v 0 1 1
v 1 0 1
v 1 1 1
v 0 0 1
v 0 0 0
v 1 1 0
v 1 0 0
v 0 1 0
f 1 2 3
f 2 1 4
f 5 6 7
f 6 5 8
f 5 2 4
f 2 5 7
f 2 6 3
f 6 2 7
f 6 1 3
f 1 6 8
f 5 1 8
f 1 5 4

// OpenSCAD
// file: ../modules/wall_plate.scad
// ===== wall plate + lock bracket =====
// Plate frame: x across, y up (= world z, 0 at the bottom of the amp box), z out of the wall
// (z = 0 is the wall side). Printed BACK DOWN: the keyhole cavities open onto the bed and the lip
// over them is an ~8.4 mm bridge; the header block and the countersinks are on top.

function kh_slot_w() = peg_neck_d + 2*kh_clr;
function kh_head_d() = peg_head_d + 2*kh_clr;
// every peg, in plate coordinates, at its HUNG position (bottom of its slot)
function peg_pts() = concat(
    [for (sx = [-1, 1], py = peg_y_amp)   [sx*peg_x(), py]],
    [for (sx = [-1, 1], py = peg_y_voice) [sx*peg_x(), voice_z0() + py]]);
function header_w() = 2*(peg_x() - leg_w/2 - 1);
function ws_pts() = [for (sx = [-1, 1], y = [12, plate_h() - header_h - 12]) [sx*ws_x, y]];

module wall_plate() {
    difference() {
        union() {
            translate([-plate_w()/2, 0, 0]) cube([plate_w(), plate_h(), plate_t]);
            // header between the legs, for the lock bracket's inserts
            translate([-header_w()/2, plate_h() - header_h, plate_t - 0.01])
                cube([header_w(), header_h, header_d - plate_t + 0.01]);
        }
        for (p = peg_pts()) translate([p[0], p[1], 0]) {
            // lip: the keyhole proper
            translate([0, 0, plate_t - kh_lip - 0.1]) linear_extrude(kh_lip + 0.2)
                keyhole2d(kh_slot_w(), kh_head_d(), peg_drop);
            // cavity behind it, head-wide over the whole travel, open to the wall
            translate([0, 0, -0.1]) linear_extrude(plate_t - kh_lip + 0.1)
                keyhole2d(kh_head_d(), kh_head_d(), peg_drop);
        }
        // wall screws, countersunk on the front face
        for (p = ws_pts()) translate([p[0], p[1], 0]) {
            translate([0, 0, -0.1]) cylinder(h = plate_t + 0.2, d = ws_d);
            translate([0, 0, plate_t - (ws_head_d - ws_d)/2])
                cylinder(h = (ws_head_d - ws_d)/2 + 0.01, d1 = ws_d, d2 = ws_head_d);
        }
        // lock-bracket inserts, down into the header's top face
        for (sx = [-1, 1])
            translate([sx*lock_screw_x, plate_h() + 0.1, (plate_t + header_d)/2])
                rotate([90, 0, 0]) cylinder(h = insert_m3_h + 1.1, d = insert_m3_d);
    }
}

// Lock bracket, world-aligned but printed flat: x across, y = distance from the wall, z = up from
// the plate top. It sits on the header and spans over both voice legs' top ends lock_gap below it.
module lock_bracket() {
    y1 = lid_back_y() - 0.5;
    difference() {
        translate([-box_w/2, 0.5, 0]) cube([box_w, y1 - 0.5, lock_t]);
        for (sx = [-1, 1]) translate([sx*lock_screw_x, (plate_t + header_d)/2, -0.1]) {
            cylinder(h = lock_t + 0.2, d = screw_clear);
            translate([0, 0, lock_t - 1.8]) cylinder(h = 2, d = 6.2);
        }
    }
}
// file: ../modules/button.scad
// ===== dome button: plunger + dome (+ voice-case holder) and the mic clamp =====
// Three printed parts and an 11 mm tactile:
//   plunger  voice-case's snap-lip cap with its dome cut off: a flat flange disc on top, the
//            Ø19.6 journal body, the snap lip and the centre post. Prints FLANGE DOWN.
//   dome     the big visible cap, glued onto the flange. Prints FLAT SIDE DOWN, any colour.
//   holder   voice-case's cup, unchanged except a longer guide (bh_guide_h 8).
// Assembly: snap the plunger through the face from the front (exactly as voice-case), screw the
// holder on from inside with the switch in it, THEN glue the dome onto the flange. Glue last, so the
// plunger can still be pulled for a holder change until you commit.

module plunger() {
    pz      = -btn_flange_top_z();     // case z + pz = print z (flange top on the bed)
    r_fl    = btn_flange_d/2;
    r_wall  = btn_wall_od/2;
    r_in    = btn_wall_id()/2;
    r_lip   = btn_lip_od()/2;
    z_fl1   = pz + btn_face_bot_z();   // flange underside = inner ceiling
    z_catch = pz + bh_catch_z();
    z_end   = pz + btn_wall_z1();
    z_slit0 = pz + btn_slit_z0;
    big     = 4*btn_flange_d;
    difference() {
        union() {
            rotate_extrude(convexity = 8) polygon([
                [0, 0], [r_fl, 0], [r_fl, z_fl1], [r_wall, z_fl1],
                [r_wall, z_catch], [r_lip, z_catch], [r_wall, z_end],
                [r_in, z_end], [r_in, z_fl1], [0, z_fl1]]);
            cylinder(h = z_fl1 + btn_post_h(), d = btn_post_d);
        }
        for (i = [0 : btn_slits - 1])
            rotate([0, 0, i*360/btn_slits])
                translate([0, big/2, (z_slit0 + z_end + 0.2)/2])
                    cube([btn_slit_w, big, z_end + 0.2 - z_slit0], center = true);
    }
}

// Spherical cap on a flat underside. The underside is flat out to btn_dome_flat_r(), then a 45 deg
// chamfer lifts the rim btn_rim_lift — that chamfer is what lets the part print with no support and
// is also the rim's clearance when the cap rocks. A shallow pocket takes the plunger flange: it
// centres the dome for gluing and is a 22 mm bridge, which an A1 handles.
module dome() {
    R0  = btn_dome_d/2;
    h   = btn_dome_h;
    Rs  = (R0*R0 + h*h)/(2*h);
    cz  = btn_rim_lift + h - Rs;                     // sphere centre
    a0  = atan2(btn_rim_lift - cz, R0);
    rs  = btn_flange_d/2 + 0.15;
    rotate_extrude(convexity = 6) polygon(concat(
        [[0, btn_dome_seat], [rs, btn_dome_seat], [rs, 0],
         [btn_dome_flat_r(), 0], [R0, btn_rim_lift]],
        arc_pts(0, cz, Rs, a0, 90, 48)));
}

// ---- holder: voice-case module, verbatim apart from the parameters ----
module button_holder() {
    h       = bh_z1() - bh_z0();
    z_floor = bh_floor_t;
    z_catch = bh_z1() - bh_catch_z();
    ear_x   = btn_pilot_pitch/2;
    lead_in = 0.6;
    union() {
        difference() {
            union() {
                cylinder(h = h, d = bh_collar_od());
                for (sx = [-1, 1]) {
                    translate([sx*ear_x, 0, 0]) cylinder(h = h, d = bh_ear_d);
                    translate([sx*(bh_collar_od()/2 + ear_x)/2, 0, h/2])
                        cube([ear_x - bh_collar_od()/2 + 2, bh_fin_t, h], center = true);
                }
            }
            translate([0, 0, z_catch]) cylinder(h = h - z_catch + 0.1, d = bh_bore_d());
            translate([0, 0, h - lead_in])
                cylinder(h = lead_in + 0.1, d1 = bh_bore_d(), d2 = bh_bore_d() + 2*lead_in);
            translate([0, 0, z_floor - bh_relief_eps])
                cylinder(h = z_catch - z_floor + 2*bh_relief_eps, d = bh_relief_d());
            for (sx = [-1, 1]) translate([sx*ear_x, 0, -0.1]) {
                cylinder(h = h + 0.2, d = bh_screw_clear);
                cylinder(h = bh_screw_cbore_h + 0.1, d = bh_screw_cbore_d);
            }
            pin_windows(z_floor);
        }
        switch_ribs(z_floor);
    }
}

module switch_ribs(z_floor) {
    z_seat = z_floor - bh_relief_eps;
    h      = sw_locate_h + bh_rib_embed;
    for (i = [0 : 3]) {
        pinned = (i % 2) == sw_pin_axis;
        len    = pinned ? sw_locate_len_pin : sw_locate_len;
        rotate([0, 0, i*90])
            translate([(sw_locate_r0() + sw_locate_r1())/2, 0, z_seat - bh_rib_embed + h/2])
                cube([sw_locate_t, len, h], center = true);
    }
}

module pin_windows(z_floor) {
    w = sw_pin_win_xy();
    for (p = sw_pin_pos())
        translate([p[0], p[1], (z_floor + 0.2)/2 - 0.1])
            cube([w[0], w[1], z_floor + 0.2], center = true);
}

// ---- mic clamp: voice-case module ----
module mic_clamp() {
    difference() {
        union() {
            translate([0, 0, mic_clamp_t/2]) cube([mic_clamp_len(), mic_clamp_w, mic_clamp_t], center = true);
            translate([0, 0, mic_clamp_t + mic_clamp_pad_h()/2])
                cube([mic_clamp_pad, min(mic_clamp_pad, mic_clamp_w), mic_clamp_pad_h()], center = true);
        }
        for (sx = [-1, 1])
            translate([sx*mic_post_pitch/2, 0, -0.1]) cylinder(h = mic_clamp_t + 0.2, d = mic_screw_clear);
    }
}
// file: ../modules/voice_box.scad
// ===== Voice S3 box: shell, rear lid, board tray, pass-through sleeve (box-local frame) =====
// The front-face features are voice-case's (button bore + recess + blind pilots, gasket mic seat +
// clamp posts), placed on a vertical face instead of a horizontal one. Same z convention, so the
// modules are unchanged apart from where they sit.

module button_cut() {
    translate([btn_pos[0], btn_pos[1], 0]) {
        translate([0, 0, -0.1]) cylinder(h = wall + 0.2, d = btn_bore_d());
        translate([0, 0, -0.1]) cylinder(h = btn_recess_depth + 0.1, d = btn_recess_d());
    }
}

module button_pilots() {
    for (sx = [-1, 1])
        translate([btn_pos[0] + sx*btn_pilot_pitch/2, btn_pos[1], wall - btn_pilot_depth])
            cylinder(h = btn_pilot_depth + 0.1, d = board_screw_pilot);
}

module mic_seat() {
    translate([mic_pos[0], mic_pos[1], 0]) {
        translate([0, 0, wall - mic_seat_depth]) linear_extrude(mic_seat_depth + 0.1)
            square([mic_board_w + 2*clr, mic_board_l + 2*clr], center = true);
        translate([0, 0, wall - mic_seat_depth - mic_gasket_depth])
            cylinder(h = mic_gasket_depth + 0.01, d = mic_gasket_d);
        translate([0, 0, -0.1])
            cylinder(h = wall - mic_seat_depth - mic_gasket_depth + 0.2, d = mic_hole_d);
    }
}

module mic_posts() {
    for (sx = [-1, 1])
        translate([mic_pos[0] + sx*mic_post_pitch/2, mic_pos[1], wall - 0.01])
            screw_boss(mic_post_h + 0.01, mic_post_od, board_screw_pilot);
}

module voice_shell() {
    h = voice_h;
    d = box_d();
    difference() {
        union() {
            box_shell(box_w, h, d, box_r, front_chamfer);
            lid_bosses(h);
            multmatrix(top_face_m(h)) mic_posts();
        }
        button_cut();
        button_pilots();
        multmatrix(top_face_m(h)) mic_seat();   // the mic is on the TOP face
        // floor: the sleeve down into the amp box
        floor_cut() translate([sleeve_x, sleeve_zc()]) circle(d = sleeve_od() + 2*clr);
        // sides: slots alongside the devkit, low (intake) and high (exhaust)
        for (sx = [-1, 1], yy = [tray_top() + 9, h - wall - 6])
            side_cut(sx) translate([s3_zc(), yy]) rotate(90) slot_field(1, s3_pocket()[1] - 4);
    }
}

module voice_lid() { box_lid(voice_h, peg_y_voice); }

// ---- board tray ----
// Both boards lie component-side UP in friction pockets, pushed toward the front by the lid through
// the tray itself. The pocket floors stand tray_seat proud of the tray so the pin-tail relief can be
// sunk into them without going through.
module pocket(cav, c, relief) {
    o = cav + [2*pocket_wall, 2*pocket_wall];
    hgt = tray_seat + pcb_t + tray_lip;
    translate([c[0], tray_top() - 0.01, c[1]])
        difference() {
            translate([-o[0]/2, 0, -o[1]/2]) cube([o[0], hgt, o[1]]);
            translate([-cav[0]/2, tray_seat, -cav[1]/2]) cube([cav[0], hgt, cav[1]]);
            for (r = relief)   // [x, z, w, l] relative to the pocket centre, sunk board_pin_h
                translate([r[0] - r[2]/2, tray_seat - board_pin_h, r[1] - r[3]/2])
                    cube([r[2], board_pin_h + 0.1, r[3]]);
        }
}

module voice_tray() {
    s3c  = [s3_x, s3_zc()];
    dacc = [dac_xc(), dac_zc()];
    difference() {
        union() {
            sled_plate(tray_t);   // same outline + notches as the amp sled
            // devkit: long axis across x, header rows along its two long (front/rear) edges
            pocket(s3_cav(), s3c,
                   [for (s = [-1, 1]) [0, s*(s3_cav()[1]/2 - pin_row_w/2 - 0.5), s3_cav()[0] - 1, pin_row_w]]);
            // DAC: long axis across x, socket on the REAR long edge
            pocket(dac_cav(), dacc,
                   [[0, 0, dac_cav()[0] - 5, dac_cav()[1] - 5]]);
        }
        // notch the DAC pocket's rear wall where the socket overhangs it
        translate([dac_jack_x() - dac_jack_w/2 - clr, tray_top() + tray_seat - 0.5, dac_edge_z() - 0.5])
            cube([dac_jack_w + 2*clr, 20, pocket_wall + board_clr + 2]);
        // sleeve
        translate([sleeve_x, wall - 0.1, sleeve_zc()]) rotate([-90, 0, 0])
            cylinder(h = tray_t + 0.2, d = sleeve_od() + 2*clr);
    }
}

// ---- pass-through sleeve: flange rests on the tray, tube drops through the voice floor, across the
// stack gap and sleeve_engage into the amp top. Printed flange-down.
module sleeve() {
    difference() {
        union() {
            cylinder(h = 1.6, d = sleeve_od() + 2*sleeve_flange);
            cylinder(h = 1.6 + sleeve_len(), d = sleeve_od());
        }
        translate([0, 0, -0.1]) cylinder(h = sleeve_len() + 2, d = sleeve_id);
        // 0.6 chamfer at the entry so a wire jacket cannot catch
        translate([0, 0, -0.1]) cylinder(h = 0.7, d1 = sleeve_id + 1.4, d2 = sleeve_id);
    }
}
// file: ../modules/amp_box.scad
// ===== amplifier box: shell, rear lid, board sled (box-local frame) =====

// cut helpers: 2D children are drawn in the plane of the wall being cut
//   through_y: 2D (x, z), cut downward from y = y_from     (top / bottom walls)
//   through_x: 2D (z, y), cut toward +x from x = x_from    (side walls)
module through_y(y_from, len) {
    translate([0, y_from, 0]) rotate([90, 0, 0]) linear_extrude(len) children();
}
// No mirror(): a mirrored 2D profile extruded and rotated comes out with reversed winding, and
// CGAL drops it ("mesh is not closed") — silently, so every side vent went missing from the STLs.
// rotate([0, -90, 0]) maps 2D (a, b) and extrusion e to (-e, b, a); start at the far side instead.
module through_x(x_from, len) {
    translate([x_from + len, 0, 0]) rotate([0, -90, 0]) linear_extrude(len) children();
}
module top_cut(h)    { through_y(h + 0.1, wall + 0.2) children(); }
module floor_cut()   { through_y(wall + 0.1, wall + 0.2) children(); }
module side_cut(sx)  { through_x(sx > 0 ? box_w/2 - wall - 0.1 : -box_w/2 - 0.1, wall + 0.2) children(); }

module lid_bosses(h) {
    for (p = lid_boss_pts(h)) lid_boss(p, box_d(), p[1] > h/2 ? 1 : -1);
}

// ---- front: the controls ----
module amp_front_cut() {
    if (ctrl_mode == "faceplate") {
        // through-window, smaller than the faceplate by the lip on every side
        translate([0, 0, -0.1]) linear_extrude(wall + 0.2) translate(face_c())
            square([amp_face_w - 2*face_lip, amp_face_h - 2*face_lip], center = true);
        // rebate the faceplate nests in, from the inside
        translate([0, 0, wall - face_rebate]) linear_extrude(face_rebate + 0.1) translate(face_c())
            square([amp_face_w + 2*face_fit, amp_face_h + 2*face_fit], center = true);
    } else {
        translate([0, 0, -0.1]) linear_extrude(wall + 0.2) {
            for (i = [-1 : 1])
                translate([amp_x + ctrl_x0 + i*ctrl_pitch, amp_pcb_y() + ctrl_axis])
                    circle(d = ctrl_bush_d + 2*clr + 2*ctrl_slack);
            translate([amp_x + ctrl_led[0], amp_pcb_y() + ctrl_led[1]]) circle(d = ctrl_led_d);
        }
    }
}

function term_xs() = let (c = (amp_term_x[0] + amp_term_x[1])/2)
                     [for (i = [0 : 3]) amp_x + c + (i - 1.5)*term_pitch];

module amp_shell() {
    h = amp_h();
    d = box_d();
    difference() {
        union() {
            box_shell(box_w, h, d, box_r, front_chamfer);
            lid_bosses(h);
        }
        amp_front_cut();
        // top: pass-through for the sleeve, over the plug zone
        top_cut(h) translate([sleeve_x, sleeve_zc()]) circle(d = sleeve_od() + 2*clr);
        // top: exhaust over the heatsink
        top_cut(h) translate([amp_x + amp_hs[0], amp_bz(amp_hs[1])]) slot_field(5, amp_hs[3] + 12);
        // top: screwdriver access to the barrier-block screws (service, box off the wall)
        if (term_access)
            for (x = term_xs())
                top_cut(h) translate([x, amp_bz(amp_term_screw_from_rear)]) circle(d = term_access_d);
        // sides: two rows of slots high on both walls, over the board
        for (sx = [-1, 1], r = [0, 1])
            side_cut(sx) translate([amp_front_z() + 40, h - wall - 4 - r*vent_pitch])
                rotate(90) slot_field(1, 50);
        // +x side: panel power switch, in the plug zone
        if (amp_psw)
            side_cut(1) translate([psw_zc(), amp_psw_y])
                if (amp_psw_shape == "rect") square(amp_psw_cut, center = true);
                else circle(d = amp_psw_round_d);
    }
}

// ---- rear lid, shared by both boxes ----
// Plate + two legs + four pegs. The legs make the cable channel (open top and bottom); the pegs on
// their ends drop into the wall plate's keyholes. Inner face down for printing; legs grow upward.
module box_lid(h, peg_ys) {
    difference() {
        union() {
            linear_extrude(lid_t) box_outline(box_w, h, box_r);
            intersection() {
                translate([0, 0, lid_t - 0.01]) linear_extrude(chan_d + 0.01) box_outline(box_w, h, box_r);
                for (sx = [-1, 1])
                    translate([sx*peg_x() - leg_w/2, 0, lid_t - 0.01]) cube([leg_w, h, chan_d + 0.01]);
            }
            for (sx = [-1, 1], py = peg_ys)
                translate([sx*peg_x(), py, lid_t + chan_d - 0.01]) peg();
        }
        for (p = lid_boss_pts(h))
            translate([p[0], p[1], -0.1]) cylinder(h = lid_t + 0.2, d = screw_clear);
        children();   // per-box cut-outs
    }
}

module amp_lid() {
    box_lid(amp_h(), peg_y_amp)
        // cable window: barrel plug and speaker wires out into the channel
        translate([amp_win_x0(), amp_win_y0(), -0.1])
            cube([amp_win_x1() - amp_win_x0(), amp_win_y1() - amp_win_y0(), lid_t + 0.2]);
}

// ---- board sled ----
// A flat plate that runs the full inside depth, front wall to lid, so the lid is what holds it in z
// and nothing in the shell has to locate it. The board screws to it OUTSIDE the box, then the pair
// slides in from the rear until the faceplate lands in its rebate. Standoffs sit on the PHOTO-
// estimated holes: this is the part to reprint when they turn out wrong, not the shell.
module sled_plate(t = sled_t, notch = true) {
    z0 = wall + 0.2;
    z1 = box_d() - 0.2;
    w  = inner_w() - 2*clr;
    difference() {
        translate([-w/2, wall, z0]) cube([w, t, z1 - z0]);
        if (notch)   // clear the bottom lid bosses and their tapers
            for (sx = [-1, 1])
                translate([sx*lid_boss_x_bot - lid_boss_od/2 - 0.6, wall - 0.1, lid_boss_z0() - 0.6])
                    cube([lid_boss_od + 1.2, t + 0.2, box_d()]);
    }
}

module mp_pocket() {
    cav = [mp_w + 2*clr, mp_l + 2*clr];
    o   = cav + [2*mp_wall, 2*mp_wall];
    translate([mp_x, wall + sled_t, mp_zc()])
        difference() {
            translate([-o[0]/2, 0, -o[1]/2]) cube([o[0], mp_lip, o[1]]);
            translate([-cav[0]/2, -0.1, -cav[1]/2]) cube([cav[0], mp_lip + 0.2, cav[1]]);
            // wire exits at both short ends (IN on one, OUT on the other)
            translate([-o[0]/2 - 0.1, -0.1, -3]) cube([o[0] + 0.2, mp_lip + 0.2, 6]);
        }
}

module amp_sled() {
    sled_plate();
    for (p = amp_holes)
        translate([amp_x + p[0], wall + sled_t - 0.01, amp_bz(p[1])]) rotate([-90, 0, 0])
            screw_boss(amp_standoff_len() + 0.01, amp_standoff_od, amp_hole_pilot);
    mp_pocket();
}
// file: ../modules/lib.scad
// ===== shared helpers (no top-level geometry) =====
// Box-local frame throughout: x across, y up, z into the box from the front face.

module rounded_rect(w, h, r) {
    hull() for (sx = [-1, 1], sy = [-1, 1])
        translate([sx*(w/2 - r), sy*(h/2 - r)]) circle(r);
}

// Box outline in the x-y plane: w wide, h tall, bottom edge at y = 0.
module box_outline(w, h, r) { translate([0, h/2]) rounded_rect(w, h, r); }

// Open-backed shell: front face at z in [0, wall], walls to z = d, open at z = d.
// The front edge is a 45 deg chamfer because the shell prints front-face-down.
module box_shell(w, h, d, r, c) {
    difference() {
        hull() {
            // inset by c on EVERY side, bottom included — box_outline() puts its bottom edge at
            // y = 0, so the smaller outline has to be lifted by c or the chamfer is all on top
            translate([0, c, 0]) linear_extrude(0.01) box_outline(w - 2*c, h - 2*c, max(0.5, r - c));
            translate([0, 0, c]) linear_extrude(d - c) box_outline(w, h, r);
        }
        translate([0, wall, wall]) linear_extrude(d)
            translate([0, (h - 2*wall)/2]) rounded_rect(w - 2*wall, h - 2*wall, max(0.5, r - wall));
    }
}

// Lid-screw boss on a top or bottom wall at the rear rim, with a 45 deg taper toward the front so it
// prints unsupported in the shell's front-face-down orientation. `p` = [x, y] of the screw axis,
// `up` = +1 for a boss hanging from the top wall, -1 for one standing on the bottom wall.
module lid_boss(p, d, up) {
    wall_y = up > 0 ? p[1] + lid_boss_od/2 + 0.5 : p[1] - lid_boss_od/2 - 0.5;
    difference() {
        union() {
            // the taper: a hull of the wall line and the boss's FRONT disc — exactly what the
            // Fusion port's loft between a rectangle and a circle builds
            hull() {
                translate([p[0], p[1], d - lid_boss_len]) cylinder(h = 0.01, d = lid_boss_od);
                translate([p[0] - lid_boss_od/2, wall_y - 0.25, d - lid_boss_len - lid_boss_taper()])
                    cube([lid_boss_od, 0.5, 0.01]);
            }
            translate([p[0], p[1], d - lid_boss_len]) cylinder(h = lid_boss_len, d = lid_boss_od);
        }
        translate([p[0], p[1], d - insert_m3_h - 1]) cylinder(h = insert_m3_h + 1.1, d = insert_m3_d);
    }
}

// A field of vent slots, long axis along z, centred at (cx, cz) in the plane they are cut through.
module slot_field(n, len) {
    for (i = [0 : n - 1])
        translate([(i - (n - 1)/2)*vent_pitch, 0])
            hull() for (s = [-1, 1]) translate([0, s*(len - vent_w)/2]) circle(d = vent_w);
}

// 2D keyhole: entry circle at the top, slot dropping `drop` below it. The peg ends at the BOTTOM of
// the slot (y = 0 here) with the box hung.
module keyhole2d(slot_w, head_d, drop) {
    hull() { circle(d = slot_w); translate([0, drop]) circle(d = slot_w); }
    translate([0, drop]) circle(d = head_d);
}

// Peg standing on z = 0, pointing +z: neck, then a 45 deg cone out to the head, then a short
// cylinder. Prints upward with nothing worse than 45 deg.
module peg() {
    neck = kh_lip + kh_clr;
    cone = (peg_head_d - peg_neck_d)/2;
    cylinder(h = neck + 0.01, d = peg_neck_d);
    translate([0, 0, neck]) cylinder(h = cone, d1 = peg_neck_d, d2 = peg_head_d);
    translate([0, 0, neck + cone]) cylinder(h = peg_head_h, d = peg_head_d);
}
function peg_len() = kh_lip + kh_clr + (peg_head_d - peg_neck_d)/2 + peg_head_h;

module screw_boss(h, od, pilot) {
    difference() {
        cylinder(h = h, d = od);
        translate([0, 0, -0.1]) cylinder(h = h + 0.2, d = pilot);
    }
}

// points along a circular arc, for rotate_extrude profiles
function arc_pts(cx, cz, r, a0, a1, n = 24) =
    [for (i = [0 : n]) let (a = a0 + (a1 - a0)*i/n) [cx + r*cos(a), cz + r*sin(a)]];

function aabb_clear(p1, s1, p2, s2) =
    (abs(p1[0]-p2[0]) >= (s1[0]+s2[0])/2) || (abs(p1[1]-p2[1]) >= (s1[1]+s2[1])/2);
// main file
// ===== Voice S3 wall unit — design checks =====
// Every fit the layout depends on, named, so that changing a [photo]/[assumed] number to its measured
// value tells you WHICH clearance it broke instead of producing a box that quietly doesn't close.
include <../modules/params.scad>
include <../modules/lib.scad>
include <../modules/amp_box.scad>
include <../modules/voice_box.scad>
include <../modules/button.scad>
include <../modules/wall_plate.scad>

function within(v, lo, hi) = v >= lo && v <= hi;
ih = inner_w()/2;

// ===================== shared envelope =====================
assert(inner_w() >= s3_pocket()[0], str("box_w too narrow for the devkit across x — needs ",
       s3_pocket()[0] + 2*wall));
assert(inner_w() >= amp_w + 2*clr, "box_w too narrow for the amp board");
assert(inner_w() >= amp_face_w + 2*face_fit, "faceplate rebate wider than the box inside");
assert(box_d() > lid_boss_len + lid_boss_taper() + 10, "box too shallow for the lid bosses");

// ===================== amplifier =====================
// vertical stack: floor, sled, standoffs, envelope, air, top
assert(amp_standoff_h >= amp_tail_h + 2.5, "standoffs leave no room for the 24 V tap wires under the PCB");
assert(amp_hs_clr >= 6, "less than 6 mm of air over the heatsink");
// faceplate window
assert(amp_face_y() - face_fit >= wall + 0.5, "faceplate rebate cuts into the floor");
assert(amp_face_y() + amp_face_h + face_fit <= amp_h() - wall - 0.5, "faceplate rebate cuts into the top");
assert(amp_face_y() > wall + sled_t, "faceplate bottom is below the sled top — the sled would block it");
assert(face_lip > 0.8 && face_lip < amp_face_h/4, "faceplate lip out of range");
assert(face_rebate < wall - 1, "faceplate rebate leaves under 1 mm of front wall");
assert(ctrl_mode == "faceplate" || ctrl_mode == "holes", "ctrl_mode must be faceplate|holes");
assert(amp_knob_proj() >= knob_min_grip,
       str("only ", amp_knob_proj(), " mm of shaft outside the box — knobs will not grip"));
if (ctrl_mode == "holes")
    assert(ctrl_x0 + ctrl_pitch + ctrl_bush_d/2 + clr + ctrl_slack < ih - 1, "outer shaft hole hits the side wall");
// rear lid bosses vs things on the floor and in the plug zone
for (p = lid_boss_pts(amp_h()))
    assert(abs(p[0]) + lid_boss_od/2 < ih, "lid boss runs into a side wall");
assert(lid_boss_x_bot - lid_boss_od/2 - 0.6 > mp_x + mp_w/2 + clr + mp_wall,
       "MP1584 pocket runs into the bottom-right lid boss notch");
assert(-lid_boss_x_bot + lid_boss_od/2 + 0.6 < mp_x - mp_w/2 - clr - mp_wall,
       "MP1584 pocket runs into the bottom-left lid boss notch");
assert(plug_zone >= mp_l + 2*clr + 2*mp_wall + 1, "plug zone shallower than the MP1584 pocket");
// sleeve hole in the amp top: clear of the top lid bosses
assert(abs(abs(sleeve_x) - lid_boss_x_top) > sleeve_od()/2 + clr + lid_boss_od/2 + 0.5,
       "sleeve hole runs into a top lid boss");
// panel switch body: inside the plug zone, clear of the top boss and the floor stack
if (amp_psw) {
    sw_x0 = ih - amp_psw_body[0];
    assert(amp_psw_cut[0]/2 + psw_zc() < box_d() - 1 && psw_zc() - amp_psw_body[1]/2 > plug_z0(),
           "panel switch body leaves the plug zone");
    assert(sw_x0 > lid_boss_x_top + lid_boss_od/2 + 0.5
           || amp_psw_y + amp_psw_body[2]/2 < lid_boss_pts(amp_h())[2][1] - lid_boss_od/2,
           "panel switch body hits the top-right lid boss");
    assert(amp_psw_y - amp_psw_body[2]/2 > wall + sled_t + mp_lip + 1, "panel switch body hits the sled");
    assert(sw_x0 > amp_aux_x + dac_aux_plug/2 + 0.5
           || amp_psw_y - amp_psw_body[2]/2 > amp_pcb_top() + amp_aux_axis + dac_aux_plug/2,
           "panel switch body hits the AUX plug");
    assert(amp_psw_y + amp_psw_cut[1]/2 < amp_h() - wall - 1 && amp_psw_y - amp_psw_cut[1]/2 > wall + 1,
           "panel switch cut-out does not fit the side wall");
}
// lid cable window: inside the legs, clear of the lid screws
assert(amp_win_x0() > -(peg_x() - leg_w/2), "cable window runs under the left leg");
assert(amp_win_x1() <  (peg_x() - leg_w/2), "cable window runs under the right leg");
assert(amp_win_y0() > lid_boss_pts(amp_h())[0][1] + screw_clear/2 + 1.5, "cable window cuts the bottom lid screws");
assert(amp_win_y1() < lid_boss_pts(amp_h())[2][1] - screw_clear/2 - 1.5, "cable window cuts the top lid screws");
// barrel plug body must clear the legs in the channel
assert(abs(amp_x + amp_dc_x) + amp_dc_plug_d/2 < peg_x() - leg_w/2, "barrel plug body hits a lid leg in the channel");
// sled standoffs: on the sled, clear of the faceplate and the plug zone
for (p = amp_holes) {
    assert(abs(p[0]) + amp_standoff_od/2 < amp_w/2 + 0.01, "a standoff sits outside the board");
    assert(within(amp_bz(p[1]), amp_front_z() + amp_face_t + amp_standoff_od/2,
                  amp_rear_z() - amp_standoff_od/2 + 0.01), "a standoff sits outside the board's length");
}

// ===================== voice box =====================
assert(voice_h >= voice_h_min(), str("voice_h too small for the dome — needs ", voice_h_min()));
assert(btn_pos[1] - btn_dome_d/2 > front_chamfer + 2, "dome overhangs the bottom edge of the face");
assert(btn_pos[1] + btn_dome_d/2 < voice_h - front_chamfer - 1, "dome overhangs the top edge of the face");
assert(btn_pos[1] - bh_collar_od()/2 > tray_top() + tray_seat + pcb_t + tray_lip
       || bh_deep_z() < s3_z0 - 1, "button holder collides with the devkit pocket");
assert(bh_deep_z() < s3_z0 - 1, str("devkit pocket starts inside the button holder's depth (",
       bh_deep_z(), ")"));
// mic block above the button holder, inside the face
// mic on the TOP face: mic_pos = [x, z]
assert(mic_pos[1] - mic_size()[1]/2 > bh_deep_z() + 1
       || voice_h - wall - mic_post_h - mic_clamp_t > btn_pos[1] + bh_collar_od()/2 + 1, "mic block runs into the button holder");
assert(mic_pos[1] - mic_size()[1]/2 > front_chamfer + wall, "mic seat runs into the front edge");
assert(mic_pos[1] + mic_size()[1]/2 < lid_boss_z0() - 1, "mic block runs into the top lid bosses");
assert(abs(mic_pos[0]) + mic_size()[0]/2 < ih, "mic posts run into a side wall");
assert(btn_pilot_pitch/2 + bh_ear_d/2 < ih, "button holder ears run into a side wall");
// tray: pockets fit, DAC behind the devkit, socket + plug land over the sleeve, notches clear
assert(abs(s3_x) + s3_pocket()[0]/2 < ih - clr, "devkit pocket wider than the tray");
assert(abs(dac_xc()) + dac_cav()[0]/2 + pocket_wall < ih - clr, "DAC pocket runs off the tray");
assert(dac_socket_z() + dac_aux_plug < sleeve_zc() + sleeve_od()/2,
       "the AUX plug head reaches past the sleeve — move the DAC forward or deepen plug_zone");
assert(dac_z0() + dac_cav()[1] + 2*pocket_wall < lid_boss_z0() - 1
       || abs(dac_xc()) + dac_cav()[0]/2 + pocket_wall < lid_boss_x_bot - lid_boss_od/2 - 0.6,
       "DAC pocket runs into a lid boss notch");
assert(abs(sleeve_x) + sleeve_od()/2 + sleeve_flange < lid_boss_x_bot - lid_boss_od/2 - 0.6,
       "sleeve flange sits over a lid boss notch");
assert(sleeve_zc() - sleeve_od()/2 - sleeve_flange > dac_edge_z(), "sleeve flange runs under the DAC");
assert(sleeve_zc() + sleeve_od()/2 + sleeve_flange < box_d() - 0.5, "sleeve flange hits the lid");
assert(tray_seat >= board_pin_h + 0.5, "pin relief would cut through the pocket floor");
// sleeve vs the peg drop: the voice box must lift off its pegs without the sleeve still engaged
assert(sleeve_engage < peg_drop - 1, "sleeve still engaged in the amp top when the pegs are free");

// ===================== button =====================
assert(btn_wall_id() > sw_diag() + 2*clr, "plunger bore does not swallow the switch diagonal");
assert(btn_post_d < sw_plunger_d, "post overhangs the switch plunger");
assert(btn_preload < sw_travel - 0.3, "preload eats the switch travel");
assert(btn_post_h() > 0, "post has no length — check the switch height");
assert(btn_flange_d < btn_dome_d - 2*btn_rim_lift, "flange is wider than the dome's flat underside");
assert(btn_recess_d() > btn_flange_d, "recess smaller than the flange");
assert(btn_edge_drop() < btn_rim_gap(),
       str("a press at the dome's edge can ground it on the face before the switch closes (",
           btn_edge_drop(), " vs ", btn_rim_gap(), ") — raise btn_flange_t or bh_guide_h"));
assert(btn_wall_z1() + btn_stroke() < bh_relief_z1() - 0.2, "plunger end bottoms on the collar floor");
assert(sw_top_z() > btn_ceil_z() + btn_stroke() + 0.2, "switch body hits the plunger ceiling at full press");

// ===================== wall plate / hanging =====================
assert(stack_gap < peg_drop, "amp box can lift off its pegs with the voice box in place");
assert(lock_gap  < peg_drop, "voice box can lift off its pegs under the lock bracket");
assert(stack_gap > sleeve_engage, "sleeve longer than the gap it crosses");
assert(plate_t - kh_lip >= peg_len() - kh_lip - kh_clr + 0.5, "peg head deeper than the keyhole cavity");
assert(kh_head_d() < leg_w + 2*plate_margin - 2, "keyhole wider than the plate edge allows");
assert(peg_x() + kh_head_d()/2 < plate_w()/2 - 1, "keyhole breaks out of the plate edge");
for (ys = [peg_y_amp, peg_y_voice]) assert(ys[1] - ys[0] > peg_drop + kh_head_d() + 2, "keyholes overlap");
assert(max(peg_y_amp) + peg_drop + kh_head_d()/2 < amp_h() + stack_gap, "amp keyhole runs into the voice box zone");
assert(voice_z0() + max(peg_y_voice) + peg_drop + kh_head_d()/2 < plate_h() - 1, "voice keyhole runs off the plate top");
assert(header_w()/2 < peg_x() - leg_w/2, "lock header collides with the legs");
assert(header_d - plate_t >= insert_m3_d + 3, "header too thin for the lock inserts");
assert(header_d < lid_back_y(), "header reaches the voice lid");
for (p = ws_pts()) assert(abs(p[0]) + ws_head_d/2 < peg_x() - leg_w/2, "wall screw under a leg");
assert(plate_h() <= 250 && plate_w() <= 250, "wall plate exceeds the A1 bed (256 x 256)");
assert(box_d() + lid_t <= 250, "box exceeds the A1 bed");

echo(str("ENVELOPE  amp ", box_w, " x ", amp_h(), " x ", box_d() + lid_t,
         "  voice ", box_w, " x ", voice_h, " x ", box_d() + lid_t,
         "  plate ", plate_w(), " x ", plate_h(), " x ", plate_t,
         "  front face ", front_y(), " mm off the wall, total height ", plate_h() + lock_t));
echo(str("BUTTON    crown ", btn_proud(), " proud, rim gap ", btn_rim_gap(), ", edge drop ", btn_edge_drop(),
         ", post ", btn_post_h(), ", holder reaches ", bh_deep_z()));
echo(str("AMP       PCB underside at y ", amp_pcb_y(), ", envelope top ", amp_env_top(),
         ", faceplate y ", amp_face_y(), "..", amp_face_y() + amp_face_h,
         ", knob shaft outside ", amp_knob_proj(), ", plug zone z ", plug_z0(), "..", box_d()));
cube(1);
